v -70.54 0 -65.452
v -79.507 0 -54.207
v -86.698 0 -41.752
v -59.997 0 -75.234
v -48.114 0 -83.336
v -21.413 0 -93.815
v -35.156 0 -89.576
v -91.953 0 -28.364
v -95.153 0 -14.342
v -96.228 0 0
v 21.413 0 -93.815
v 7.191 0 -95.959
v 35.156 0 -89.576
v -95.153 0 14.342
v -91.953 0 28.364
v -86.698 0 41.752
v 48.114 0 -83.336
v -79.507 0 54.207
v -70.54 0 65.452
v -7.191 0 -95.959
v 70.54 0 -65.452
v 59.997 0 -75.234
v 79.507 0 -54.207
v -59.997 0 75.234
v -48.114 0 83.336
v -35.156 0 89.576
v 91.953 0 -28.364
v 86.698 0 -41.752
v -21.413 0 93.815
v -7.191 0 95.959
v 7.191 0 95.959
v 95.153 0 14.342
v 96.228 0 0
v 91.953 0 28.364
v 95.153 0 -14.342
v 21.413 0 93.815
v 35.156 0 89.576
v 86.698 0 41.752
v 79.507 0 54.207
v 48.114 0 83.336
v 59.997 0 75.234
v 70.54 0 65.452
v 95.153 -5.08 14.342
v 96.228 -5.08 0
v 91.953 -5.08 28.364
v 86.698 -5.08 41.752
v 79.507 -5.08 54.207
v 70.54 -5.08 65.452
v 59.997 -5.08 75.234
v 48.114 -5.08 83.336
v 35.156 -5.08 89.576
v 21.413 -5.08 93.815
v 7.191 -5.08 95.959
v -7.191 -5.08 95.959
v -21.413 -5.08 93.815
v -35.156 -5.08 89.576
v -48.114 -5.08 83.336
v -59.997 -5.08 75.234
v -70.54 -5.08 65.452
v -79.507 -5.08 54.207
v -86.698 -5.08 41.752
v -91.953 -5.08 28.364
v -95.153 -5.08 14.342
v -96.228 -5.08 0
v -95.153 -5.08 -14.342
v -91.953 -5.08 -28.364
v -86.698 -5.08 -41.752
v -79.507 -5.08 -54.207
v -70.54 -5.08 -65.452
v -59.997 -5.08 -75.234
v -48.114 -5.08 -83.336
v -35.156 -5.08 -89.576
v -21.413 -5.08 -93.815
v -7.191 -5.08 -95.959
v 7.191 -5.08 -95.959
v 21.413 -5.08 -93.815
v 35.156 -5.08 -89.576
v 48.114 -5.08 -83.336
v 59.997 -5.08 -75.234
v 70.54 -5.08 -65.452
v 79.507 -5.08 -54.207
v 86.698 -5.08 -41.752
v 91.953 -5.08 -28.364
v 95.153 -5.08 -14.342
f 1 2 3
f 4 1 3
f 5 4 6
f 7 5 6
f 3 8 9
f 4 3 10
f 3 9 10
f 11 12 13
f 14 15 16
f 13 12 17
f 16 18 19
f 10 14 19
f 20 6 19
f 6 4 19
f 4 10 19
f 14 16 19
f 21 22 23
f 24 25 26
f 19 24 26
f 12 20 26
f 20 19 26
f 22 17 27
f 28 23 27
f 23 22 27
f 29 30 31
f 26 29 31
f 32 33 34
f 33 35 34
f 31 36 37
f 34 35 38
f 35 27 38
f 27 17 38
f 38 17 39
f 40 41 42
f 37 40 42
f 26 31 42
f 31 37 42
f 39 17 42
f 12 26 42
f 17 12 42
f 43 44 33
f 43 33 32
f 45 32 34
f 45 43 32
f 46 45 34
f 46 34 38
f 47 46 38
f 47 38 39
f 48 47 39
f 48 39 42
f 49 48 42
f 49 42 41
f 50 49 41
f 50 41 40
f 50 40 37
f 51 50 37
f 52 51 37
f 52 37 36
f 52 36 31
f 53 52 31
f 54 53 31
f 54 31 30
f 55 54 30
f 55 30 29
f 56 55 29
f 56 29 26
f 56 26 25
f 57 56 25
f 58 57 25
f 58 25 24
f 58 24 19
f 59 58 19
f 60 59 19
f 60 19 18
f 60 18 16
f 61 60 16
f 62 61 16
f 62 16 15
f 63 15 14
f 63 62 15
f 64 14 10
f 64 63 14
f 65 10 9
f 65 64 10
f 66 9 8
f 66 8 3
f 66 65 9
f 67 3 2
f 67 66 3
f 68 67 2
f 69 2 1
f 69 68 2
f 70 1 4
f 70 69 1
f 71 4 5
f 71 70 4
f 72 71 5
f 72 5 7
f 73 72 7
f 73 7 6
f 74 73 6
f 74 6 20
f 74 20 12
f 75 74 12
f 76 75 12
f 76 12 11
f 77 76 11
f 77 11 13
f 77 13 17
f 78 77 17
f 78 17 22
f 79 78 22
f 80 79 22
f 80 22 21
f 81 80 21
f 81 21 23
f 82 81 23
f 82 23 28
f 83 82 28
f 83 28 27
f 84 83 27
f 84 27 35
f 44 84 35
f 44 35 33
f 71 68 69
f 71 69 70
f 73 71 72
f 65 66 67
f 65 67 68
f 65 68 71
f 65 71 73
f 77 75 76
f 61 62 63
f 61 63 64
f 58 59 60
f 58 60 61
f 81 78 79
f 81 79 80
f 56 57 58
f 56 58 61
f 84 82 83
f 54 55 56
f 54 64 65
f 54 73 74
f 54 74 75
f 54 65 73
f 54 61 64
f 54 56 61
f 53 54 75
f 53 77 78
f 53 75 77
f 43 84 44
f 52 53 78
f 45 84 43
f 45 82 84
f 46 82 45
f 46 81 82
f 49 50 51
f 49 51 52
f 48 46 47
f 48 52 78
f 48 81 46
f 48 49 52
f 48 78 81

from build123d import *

# Parameters (mm, degrees)
F0_W     = 368.677914
F0_H     = 204.665296
F1_DEPTH = 12.7
F2_W     = 368.677914
F2_H     = 204.665296
F2_R     = 96.2279
F3_DEPTH = 12.7
F4_DEPTH = 7.62


with BuildPart() as f1:
    # F0 (on Front) → F1 (new body)
    with BuildSketch(Plane.XZ):
        with Locations((0.233635, 0.70091)):
            Rectangle(F0_W, F0_H)
    extrude(amount=F1_DEPTH)

    # F2 (on face) → F3 (cut)
    with BuildSketch(Plane.XZ.offset(12.7)):
        with Locations((0.233635, 0.70091)):
            Rectangle(F2_W, F2_H)
        Circle(F2_R, mode=Mode.SUBTRACT)
    extrude(amount=-F3_DEPTH, mode=Mode.SUBTRACT)

    # F2 (on face) + F0 (on Front) → F4 (cut)
    with BuildSketch(Plane.XZ.offset(12.7)):
        Circle(F2_R)
    with BuildSketch(Plane.XZ):
        with Locations((0.233635, 0.70091)):
            Rectangle(F0_W, F0_H)
    extrude(amount=-F4_DEPTH, mode=Mode.SUBTRACT)


solid = f1.part
